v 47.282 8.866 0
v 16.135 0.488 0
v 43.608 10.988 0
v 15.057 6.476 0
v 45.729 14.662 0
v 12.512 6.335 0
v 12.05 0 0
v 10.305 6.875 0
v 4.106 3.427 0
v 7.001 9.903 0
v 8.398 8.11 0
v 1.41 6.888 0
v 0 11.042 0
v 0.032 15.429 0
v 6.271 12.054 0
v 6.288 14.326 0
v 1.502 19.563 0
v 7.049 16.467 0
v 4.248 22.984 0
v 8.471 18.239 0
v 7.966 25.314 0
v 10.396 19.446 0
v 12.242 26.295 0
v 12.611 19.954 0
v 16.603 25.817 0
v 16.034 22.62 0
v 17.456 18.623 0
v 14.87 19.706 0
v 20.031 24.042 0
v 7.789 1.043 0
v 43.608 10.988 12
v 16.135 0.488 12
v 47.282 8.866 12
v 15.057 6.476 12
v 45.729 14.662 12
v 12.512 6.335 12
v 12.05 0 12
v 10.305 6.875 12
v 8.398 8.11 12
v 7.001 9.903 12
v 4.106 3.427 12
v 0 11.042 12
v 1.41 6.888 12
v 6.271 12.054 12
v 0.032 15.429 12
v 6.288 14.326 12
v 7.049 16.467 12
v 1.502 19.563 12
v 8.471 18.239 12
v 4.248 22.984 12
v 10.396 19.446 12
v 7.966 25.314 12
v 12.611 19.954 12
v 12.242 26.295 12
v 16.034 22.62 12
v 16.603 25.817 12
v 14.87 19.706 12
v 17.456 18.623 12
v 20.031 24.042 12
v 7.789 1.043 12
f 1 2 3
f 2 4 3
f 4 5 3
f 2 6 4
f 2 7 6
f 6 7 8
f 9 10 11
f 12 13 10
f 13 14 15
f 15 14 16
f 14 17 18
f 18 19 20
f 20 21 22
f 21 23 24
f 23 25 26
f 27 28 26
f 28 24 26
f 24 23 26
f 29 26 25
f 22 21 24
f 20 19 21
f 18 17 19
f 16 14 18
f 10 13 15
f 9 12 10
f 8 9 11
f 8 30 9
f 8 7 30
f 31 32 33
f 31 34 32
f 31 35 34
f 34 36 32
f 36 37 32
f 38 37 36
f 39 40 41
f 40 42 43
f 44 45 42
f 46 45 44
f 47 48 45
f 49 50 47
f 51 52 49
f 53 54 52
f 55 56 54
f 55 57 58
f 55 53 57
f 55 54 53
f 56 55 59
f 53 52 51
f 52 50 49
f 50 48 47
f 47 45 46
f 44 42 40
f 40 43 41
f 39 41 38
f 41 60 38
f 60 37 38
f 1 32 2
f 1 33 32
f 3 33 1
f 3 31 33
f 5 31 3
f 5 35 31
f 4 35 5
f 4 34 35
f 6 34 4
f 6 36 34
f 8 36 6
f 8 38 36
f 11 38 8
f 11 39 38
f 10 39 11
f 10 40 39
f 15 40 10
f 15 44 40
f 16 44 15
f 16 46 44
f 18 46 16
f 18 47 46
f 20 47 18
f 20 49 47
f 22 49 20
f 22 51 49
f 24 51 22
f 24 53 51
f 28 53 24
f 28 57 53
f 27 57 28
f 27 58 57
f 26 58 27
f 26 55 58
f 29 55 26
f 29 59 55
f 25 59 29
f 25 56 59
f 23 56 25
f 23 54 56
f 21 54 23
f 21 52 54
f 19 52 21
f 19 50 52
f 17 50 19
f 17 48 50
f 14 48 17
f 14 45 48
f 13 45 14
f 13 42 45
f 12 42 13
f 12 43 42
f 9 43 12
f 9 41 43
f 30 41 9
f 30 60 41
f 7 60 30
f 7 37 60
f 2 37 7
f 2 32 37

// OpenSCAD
$fn = 32;

// ----------------------------------------------------------------------
// Eye lug: ring_tail, 12 mm thick
// ----------------------------------------------------------------------

// --- parameters (mm) ---
profile_height = 12;      // extrusion height
profile_points = 30;      // points of the closed outline

profile = [[16.034, 22.62], [20.031, 24.042], [16.603, 25.817], [12.242, 26.295], [7.966, 25.314], [4.248, 22.984], [1.502, 19.563], [0.032, 15.429], [0, 11.042], [1.41, 6.888], [4.106, 3.427], [7.789, 1.043], [12.05, 0], [16.135, 0.488], [47.282, 8.866], [43.608, 10.988], [45.729, 14.662], [15.057, 6.476], [12.512, 6.335], [10.305, 6.875], [8.398, 8.11], [7.001, 9.903], [6.271, 12.054], [6.288, 14.326], [7.049, 16.467], [8.471, 18.239], [10.396, 19.446], [12.611, 19.954], [14.87, 19.706], [17.456, 18.623]];  // single closed polygon, 30 points, counter clockwise

// --- the one profile operation ---
linear_extrude(height = profile_height) polygon(points = profile);
